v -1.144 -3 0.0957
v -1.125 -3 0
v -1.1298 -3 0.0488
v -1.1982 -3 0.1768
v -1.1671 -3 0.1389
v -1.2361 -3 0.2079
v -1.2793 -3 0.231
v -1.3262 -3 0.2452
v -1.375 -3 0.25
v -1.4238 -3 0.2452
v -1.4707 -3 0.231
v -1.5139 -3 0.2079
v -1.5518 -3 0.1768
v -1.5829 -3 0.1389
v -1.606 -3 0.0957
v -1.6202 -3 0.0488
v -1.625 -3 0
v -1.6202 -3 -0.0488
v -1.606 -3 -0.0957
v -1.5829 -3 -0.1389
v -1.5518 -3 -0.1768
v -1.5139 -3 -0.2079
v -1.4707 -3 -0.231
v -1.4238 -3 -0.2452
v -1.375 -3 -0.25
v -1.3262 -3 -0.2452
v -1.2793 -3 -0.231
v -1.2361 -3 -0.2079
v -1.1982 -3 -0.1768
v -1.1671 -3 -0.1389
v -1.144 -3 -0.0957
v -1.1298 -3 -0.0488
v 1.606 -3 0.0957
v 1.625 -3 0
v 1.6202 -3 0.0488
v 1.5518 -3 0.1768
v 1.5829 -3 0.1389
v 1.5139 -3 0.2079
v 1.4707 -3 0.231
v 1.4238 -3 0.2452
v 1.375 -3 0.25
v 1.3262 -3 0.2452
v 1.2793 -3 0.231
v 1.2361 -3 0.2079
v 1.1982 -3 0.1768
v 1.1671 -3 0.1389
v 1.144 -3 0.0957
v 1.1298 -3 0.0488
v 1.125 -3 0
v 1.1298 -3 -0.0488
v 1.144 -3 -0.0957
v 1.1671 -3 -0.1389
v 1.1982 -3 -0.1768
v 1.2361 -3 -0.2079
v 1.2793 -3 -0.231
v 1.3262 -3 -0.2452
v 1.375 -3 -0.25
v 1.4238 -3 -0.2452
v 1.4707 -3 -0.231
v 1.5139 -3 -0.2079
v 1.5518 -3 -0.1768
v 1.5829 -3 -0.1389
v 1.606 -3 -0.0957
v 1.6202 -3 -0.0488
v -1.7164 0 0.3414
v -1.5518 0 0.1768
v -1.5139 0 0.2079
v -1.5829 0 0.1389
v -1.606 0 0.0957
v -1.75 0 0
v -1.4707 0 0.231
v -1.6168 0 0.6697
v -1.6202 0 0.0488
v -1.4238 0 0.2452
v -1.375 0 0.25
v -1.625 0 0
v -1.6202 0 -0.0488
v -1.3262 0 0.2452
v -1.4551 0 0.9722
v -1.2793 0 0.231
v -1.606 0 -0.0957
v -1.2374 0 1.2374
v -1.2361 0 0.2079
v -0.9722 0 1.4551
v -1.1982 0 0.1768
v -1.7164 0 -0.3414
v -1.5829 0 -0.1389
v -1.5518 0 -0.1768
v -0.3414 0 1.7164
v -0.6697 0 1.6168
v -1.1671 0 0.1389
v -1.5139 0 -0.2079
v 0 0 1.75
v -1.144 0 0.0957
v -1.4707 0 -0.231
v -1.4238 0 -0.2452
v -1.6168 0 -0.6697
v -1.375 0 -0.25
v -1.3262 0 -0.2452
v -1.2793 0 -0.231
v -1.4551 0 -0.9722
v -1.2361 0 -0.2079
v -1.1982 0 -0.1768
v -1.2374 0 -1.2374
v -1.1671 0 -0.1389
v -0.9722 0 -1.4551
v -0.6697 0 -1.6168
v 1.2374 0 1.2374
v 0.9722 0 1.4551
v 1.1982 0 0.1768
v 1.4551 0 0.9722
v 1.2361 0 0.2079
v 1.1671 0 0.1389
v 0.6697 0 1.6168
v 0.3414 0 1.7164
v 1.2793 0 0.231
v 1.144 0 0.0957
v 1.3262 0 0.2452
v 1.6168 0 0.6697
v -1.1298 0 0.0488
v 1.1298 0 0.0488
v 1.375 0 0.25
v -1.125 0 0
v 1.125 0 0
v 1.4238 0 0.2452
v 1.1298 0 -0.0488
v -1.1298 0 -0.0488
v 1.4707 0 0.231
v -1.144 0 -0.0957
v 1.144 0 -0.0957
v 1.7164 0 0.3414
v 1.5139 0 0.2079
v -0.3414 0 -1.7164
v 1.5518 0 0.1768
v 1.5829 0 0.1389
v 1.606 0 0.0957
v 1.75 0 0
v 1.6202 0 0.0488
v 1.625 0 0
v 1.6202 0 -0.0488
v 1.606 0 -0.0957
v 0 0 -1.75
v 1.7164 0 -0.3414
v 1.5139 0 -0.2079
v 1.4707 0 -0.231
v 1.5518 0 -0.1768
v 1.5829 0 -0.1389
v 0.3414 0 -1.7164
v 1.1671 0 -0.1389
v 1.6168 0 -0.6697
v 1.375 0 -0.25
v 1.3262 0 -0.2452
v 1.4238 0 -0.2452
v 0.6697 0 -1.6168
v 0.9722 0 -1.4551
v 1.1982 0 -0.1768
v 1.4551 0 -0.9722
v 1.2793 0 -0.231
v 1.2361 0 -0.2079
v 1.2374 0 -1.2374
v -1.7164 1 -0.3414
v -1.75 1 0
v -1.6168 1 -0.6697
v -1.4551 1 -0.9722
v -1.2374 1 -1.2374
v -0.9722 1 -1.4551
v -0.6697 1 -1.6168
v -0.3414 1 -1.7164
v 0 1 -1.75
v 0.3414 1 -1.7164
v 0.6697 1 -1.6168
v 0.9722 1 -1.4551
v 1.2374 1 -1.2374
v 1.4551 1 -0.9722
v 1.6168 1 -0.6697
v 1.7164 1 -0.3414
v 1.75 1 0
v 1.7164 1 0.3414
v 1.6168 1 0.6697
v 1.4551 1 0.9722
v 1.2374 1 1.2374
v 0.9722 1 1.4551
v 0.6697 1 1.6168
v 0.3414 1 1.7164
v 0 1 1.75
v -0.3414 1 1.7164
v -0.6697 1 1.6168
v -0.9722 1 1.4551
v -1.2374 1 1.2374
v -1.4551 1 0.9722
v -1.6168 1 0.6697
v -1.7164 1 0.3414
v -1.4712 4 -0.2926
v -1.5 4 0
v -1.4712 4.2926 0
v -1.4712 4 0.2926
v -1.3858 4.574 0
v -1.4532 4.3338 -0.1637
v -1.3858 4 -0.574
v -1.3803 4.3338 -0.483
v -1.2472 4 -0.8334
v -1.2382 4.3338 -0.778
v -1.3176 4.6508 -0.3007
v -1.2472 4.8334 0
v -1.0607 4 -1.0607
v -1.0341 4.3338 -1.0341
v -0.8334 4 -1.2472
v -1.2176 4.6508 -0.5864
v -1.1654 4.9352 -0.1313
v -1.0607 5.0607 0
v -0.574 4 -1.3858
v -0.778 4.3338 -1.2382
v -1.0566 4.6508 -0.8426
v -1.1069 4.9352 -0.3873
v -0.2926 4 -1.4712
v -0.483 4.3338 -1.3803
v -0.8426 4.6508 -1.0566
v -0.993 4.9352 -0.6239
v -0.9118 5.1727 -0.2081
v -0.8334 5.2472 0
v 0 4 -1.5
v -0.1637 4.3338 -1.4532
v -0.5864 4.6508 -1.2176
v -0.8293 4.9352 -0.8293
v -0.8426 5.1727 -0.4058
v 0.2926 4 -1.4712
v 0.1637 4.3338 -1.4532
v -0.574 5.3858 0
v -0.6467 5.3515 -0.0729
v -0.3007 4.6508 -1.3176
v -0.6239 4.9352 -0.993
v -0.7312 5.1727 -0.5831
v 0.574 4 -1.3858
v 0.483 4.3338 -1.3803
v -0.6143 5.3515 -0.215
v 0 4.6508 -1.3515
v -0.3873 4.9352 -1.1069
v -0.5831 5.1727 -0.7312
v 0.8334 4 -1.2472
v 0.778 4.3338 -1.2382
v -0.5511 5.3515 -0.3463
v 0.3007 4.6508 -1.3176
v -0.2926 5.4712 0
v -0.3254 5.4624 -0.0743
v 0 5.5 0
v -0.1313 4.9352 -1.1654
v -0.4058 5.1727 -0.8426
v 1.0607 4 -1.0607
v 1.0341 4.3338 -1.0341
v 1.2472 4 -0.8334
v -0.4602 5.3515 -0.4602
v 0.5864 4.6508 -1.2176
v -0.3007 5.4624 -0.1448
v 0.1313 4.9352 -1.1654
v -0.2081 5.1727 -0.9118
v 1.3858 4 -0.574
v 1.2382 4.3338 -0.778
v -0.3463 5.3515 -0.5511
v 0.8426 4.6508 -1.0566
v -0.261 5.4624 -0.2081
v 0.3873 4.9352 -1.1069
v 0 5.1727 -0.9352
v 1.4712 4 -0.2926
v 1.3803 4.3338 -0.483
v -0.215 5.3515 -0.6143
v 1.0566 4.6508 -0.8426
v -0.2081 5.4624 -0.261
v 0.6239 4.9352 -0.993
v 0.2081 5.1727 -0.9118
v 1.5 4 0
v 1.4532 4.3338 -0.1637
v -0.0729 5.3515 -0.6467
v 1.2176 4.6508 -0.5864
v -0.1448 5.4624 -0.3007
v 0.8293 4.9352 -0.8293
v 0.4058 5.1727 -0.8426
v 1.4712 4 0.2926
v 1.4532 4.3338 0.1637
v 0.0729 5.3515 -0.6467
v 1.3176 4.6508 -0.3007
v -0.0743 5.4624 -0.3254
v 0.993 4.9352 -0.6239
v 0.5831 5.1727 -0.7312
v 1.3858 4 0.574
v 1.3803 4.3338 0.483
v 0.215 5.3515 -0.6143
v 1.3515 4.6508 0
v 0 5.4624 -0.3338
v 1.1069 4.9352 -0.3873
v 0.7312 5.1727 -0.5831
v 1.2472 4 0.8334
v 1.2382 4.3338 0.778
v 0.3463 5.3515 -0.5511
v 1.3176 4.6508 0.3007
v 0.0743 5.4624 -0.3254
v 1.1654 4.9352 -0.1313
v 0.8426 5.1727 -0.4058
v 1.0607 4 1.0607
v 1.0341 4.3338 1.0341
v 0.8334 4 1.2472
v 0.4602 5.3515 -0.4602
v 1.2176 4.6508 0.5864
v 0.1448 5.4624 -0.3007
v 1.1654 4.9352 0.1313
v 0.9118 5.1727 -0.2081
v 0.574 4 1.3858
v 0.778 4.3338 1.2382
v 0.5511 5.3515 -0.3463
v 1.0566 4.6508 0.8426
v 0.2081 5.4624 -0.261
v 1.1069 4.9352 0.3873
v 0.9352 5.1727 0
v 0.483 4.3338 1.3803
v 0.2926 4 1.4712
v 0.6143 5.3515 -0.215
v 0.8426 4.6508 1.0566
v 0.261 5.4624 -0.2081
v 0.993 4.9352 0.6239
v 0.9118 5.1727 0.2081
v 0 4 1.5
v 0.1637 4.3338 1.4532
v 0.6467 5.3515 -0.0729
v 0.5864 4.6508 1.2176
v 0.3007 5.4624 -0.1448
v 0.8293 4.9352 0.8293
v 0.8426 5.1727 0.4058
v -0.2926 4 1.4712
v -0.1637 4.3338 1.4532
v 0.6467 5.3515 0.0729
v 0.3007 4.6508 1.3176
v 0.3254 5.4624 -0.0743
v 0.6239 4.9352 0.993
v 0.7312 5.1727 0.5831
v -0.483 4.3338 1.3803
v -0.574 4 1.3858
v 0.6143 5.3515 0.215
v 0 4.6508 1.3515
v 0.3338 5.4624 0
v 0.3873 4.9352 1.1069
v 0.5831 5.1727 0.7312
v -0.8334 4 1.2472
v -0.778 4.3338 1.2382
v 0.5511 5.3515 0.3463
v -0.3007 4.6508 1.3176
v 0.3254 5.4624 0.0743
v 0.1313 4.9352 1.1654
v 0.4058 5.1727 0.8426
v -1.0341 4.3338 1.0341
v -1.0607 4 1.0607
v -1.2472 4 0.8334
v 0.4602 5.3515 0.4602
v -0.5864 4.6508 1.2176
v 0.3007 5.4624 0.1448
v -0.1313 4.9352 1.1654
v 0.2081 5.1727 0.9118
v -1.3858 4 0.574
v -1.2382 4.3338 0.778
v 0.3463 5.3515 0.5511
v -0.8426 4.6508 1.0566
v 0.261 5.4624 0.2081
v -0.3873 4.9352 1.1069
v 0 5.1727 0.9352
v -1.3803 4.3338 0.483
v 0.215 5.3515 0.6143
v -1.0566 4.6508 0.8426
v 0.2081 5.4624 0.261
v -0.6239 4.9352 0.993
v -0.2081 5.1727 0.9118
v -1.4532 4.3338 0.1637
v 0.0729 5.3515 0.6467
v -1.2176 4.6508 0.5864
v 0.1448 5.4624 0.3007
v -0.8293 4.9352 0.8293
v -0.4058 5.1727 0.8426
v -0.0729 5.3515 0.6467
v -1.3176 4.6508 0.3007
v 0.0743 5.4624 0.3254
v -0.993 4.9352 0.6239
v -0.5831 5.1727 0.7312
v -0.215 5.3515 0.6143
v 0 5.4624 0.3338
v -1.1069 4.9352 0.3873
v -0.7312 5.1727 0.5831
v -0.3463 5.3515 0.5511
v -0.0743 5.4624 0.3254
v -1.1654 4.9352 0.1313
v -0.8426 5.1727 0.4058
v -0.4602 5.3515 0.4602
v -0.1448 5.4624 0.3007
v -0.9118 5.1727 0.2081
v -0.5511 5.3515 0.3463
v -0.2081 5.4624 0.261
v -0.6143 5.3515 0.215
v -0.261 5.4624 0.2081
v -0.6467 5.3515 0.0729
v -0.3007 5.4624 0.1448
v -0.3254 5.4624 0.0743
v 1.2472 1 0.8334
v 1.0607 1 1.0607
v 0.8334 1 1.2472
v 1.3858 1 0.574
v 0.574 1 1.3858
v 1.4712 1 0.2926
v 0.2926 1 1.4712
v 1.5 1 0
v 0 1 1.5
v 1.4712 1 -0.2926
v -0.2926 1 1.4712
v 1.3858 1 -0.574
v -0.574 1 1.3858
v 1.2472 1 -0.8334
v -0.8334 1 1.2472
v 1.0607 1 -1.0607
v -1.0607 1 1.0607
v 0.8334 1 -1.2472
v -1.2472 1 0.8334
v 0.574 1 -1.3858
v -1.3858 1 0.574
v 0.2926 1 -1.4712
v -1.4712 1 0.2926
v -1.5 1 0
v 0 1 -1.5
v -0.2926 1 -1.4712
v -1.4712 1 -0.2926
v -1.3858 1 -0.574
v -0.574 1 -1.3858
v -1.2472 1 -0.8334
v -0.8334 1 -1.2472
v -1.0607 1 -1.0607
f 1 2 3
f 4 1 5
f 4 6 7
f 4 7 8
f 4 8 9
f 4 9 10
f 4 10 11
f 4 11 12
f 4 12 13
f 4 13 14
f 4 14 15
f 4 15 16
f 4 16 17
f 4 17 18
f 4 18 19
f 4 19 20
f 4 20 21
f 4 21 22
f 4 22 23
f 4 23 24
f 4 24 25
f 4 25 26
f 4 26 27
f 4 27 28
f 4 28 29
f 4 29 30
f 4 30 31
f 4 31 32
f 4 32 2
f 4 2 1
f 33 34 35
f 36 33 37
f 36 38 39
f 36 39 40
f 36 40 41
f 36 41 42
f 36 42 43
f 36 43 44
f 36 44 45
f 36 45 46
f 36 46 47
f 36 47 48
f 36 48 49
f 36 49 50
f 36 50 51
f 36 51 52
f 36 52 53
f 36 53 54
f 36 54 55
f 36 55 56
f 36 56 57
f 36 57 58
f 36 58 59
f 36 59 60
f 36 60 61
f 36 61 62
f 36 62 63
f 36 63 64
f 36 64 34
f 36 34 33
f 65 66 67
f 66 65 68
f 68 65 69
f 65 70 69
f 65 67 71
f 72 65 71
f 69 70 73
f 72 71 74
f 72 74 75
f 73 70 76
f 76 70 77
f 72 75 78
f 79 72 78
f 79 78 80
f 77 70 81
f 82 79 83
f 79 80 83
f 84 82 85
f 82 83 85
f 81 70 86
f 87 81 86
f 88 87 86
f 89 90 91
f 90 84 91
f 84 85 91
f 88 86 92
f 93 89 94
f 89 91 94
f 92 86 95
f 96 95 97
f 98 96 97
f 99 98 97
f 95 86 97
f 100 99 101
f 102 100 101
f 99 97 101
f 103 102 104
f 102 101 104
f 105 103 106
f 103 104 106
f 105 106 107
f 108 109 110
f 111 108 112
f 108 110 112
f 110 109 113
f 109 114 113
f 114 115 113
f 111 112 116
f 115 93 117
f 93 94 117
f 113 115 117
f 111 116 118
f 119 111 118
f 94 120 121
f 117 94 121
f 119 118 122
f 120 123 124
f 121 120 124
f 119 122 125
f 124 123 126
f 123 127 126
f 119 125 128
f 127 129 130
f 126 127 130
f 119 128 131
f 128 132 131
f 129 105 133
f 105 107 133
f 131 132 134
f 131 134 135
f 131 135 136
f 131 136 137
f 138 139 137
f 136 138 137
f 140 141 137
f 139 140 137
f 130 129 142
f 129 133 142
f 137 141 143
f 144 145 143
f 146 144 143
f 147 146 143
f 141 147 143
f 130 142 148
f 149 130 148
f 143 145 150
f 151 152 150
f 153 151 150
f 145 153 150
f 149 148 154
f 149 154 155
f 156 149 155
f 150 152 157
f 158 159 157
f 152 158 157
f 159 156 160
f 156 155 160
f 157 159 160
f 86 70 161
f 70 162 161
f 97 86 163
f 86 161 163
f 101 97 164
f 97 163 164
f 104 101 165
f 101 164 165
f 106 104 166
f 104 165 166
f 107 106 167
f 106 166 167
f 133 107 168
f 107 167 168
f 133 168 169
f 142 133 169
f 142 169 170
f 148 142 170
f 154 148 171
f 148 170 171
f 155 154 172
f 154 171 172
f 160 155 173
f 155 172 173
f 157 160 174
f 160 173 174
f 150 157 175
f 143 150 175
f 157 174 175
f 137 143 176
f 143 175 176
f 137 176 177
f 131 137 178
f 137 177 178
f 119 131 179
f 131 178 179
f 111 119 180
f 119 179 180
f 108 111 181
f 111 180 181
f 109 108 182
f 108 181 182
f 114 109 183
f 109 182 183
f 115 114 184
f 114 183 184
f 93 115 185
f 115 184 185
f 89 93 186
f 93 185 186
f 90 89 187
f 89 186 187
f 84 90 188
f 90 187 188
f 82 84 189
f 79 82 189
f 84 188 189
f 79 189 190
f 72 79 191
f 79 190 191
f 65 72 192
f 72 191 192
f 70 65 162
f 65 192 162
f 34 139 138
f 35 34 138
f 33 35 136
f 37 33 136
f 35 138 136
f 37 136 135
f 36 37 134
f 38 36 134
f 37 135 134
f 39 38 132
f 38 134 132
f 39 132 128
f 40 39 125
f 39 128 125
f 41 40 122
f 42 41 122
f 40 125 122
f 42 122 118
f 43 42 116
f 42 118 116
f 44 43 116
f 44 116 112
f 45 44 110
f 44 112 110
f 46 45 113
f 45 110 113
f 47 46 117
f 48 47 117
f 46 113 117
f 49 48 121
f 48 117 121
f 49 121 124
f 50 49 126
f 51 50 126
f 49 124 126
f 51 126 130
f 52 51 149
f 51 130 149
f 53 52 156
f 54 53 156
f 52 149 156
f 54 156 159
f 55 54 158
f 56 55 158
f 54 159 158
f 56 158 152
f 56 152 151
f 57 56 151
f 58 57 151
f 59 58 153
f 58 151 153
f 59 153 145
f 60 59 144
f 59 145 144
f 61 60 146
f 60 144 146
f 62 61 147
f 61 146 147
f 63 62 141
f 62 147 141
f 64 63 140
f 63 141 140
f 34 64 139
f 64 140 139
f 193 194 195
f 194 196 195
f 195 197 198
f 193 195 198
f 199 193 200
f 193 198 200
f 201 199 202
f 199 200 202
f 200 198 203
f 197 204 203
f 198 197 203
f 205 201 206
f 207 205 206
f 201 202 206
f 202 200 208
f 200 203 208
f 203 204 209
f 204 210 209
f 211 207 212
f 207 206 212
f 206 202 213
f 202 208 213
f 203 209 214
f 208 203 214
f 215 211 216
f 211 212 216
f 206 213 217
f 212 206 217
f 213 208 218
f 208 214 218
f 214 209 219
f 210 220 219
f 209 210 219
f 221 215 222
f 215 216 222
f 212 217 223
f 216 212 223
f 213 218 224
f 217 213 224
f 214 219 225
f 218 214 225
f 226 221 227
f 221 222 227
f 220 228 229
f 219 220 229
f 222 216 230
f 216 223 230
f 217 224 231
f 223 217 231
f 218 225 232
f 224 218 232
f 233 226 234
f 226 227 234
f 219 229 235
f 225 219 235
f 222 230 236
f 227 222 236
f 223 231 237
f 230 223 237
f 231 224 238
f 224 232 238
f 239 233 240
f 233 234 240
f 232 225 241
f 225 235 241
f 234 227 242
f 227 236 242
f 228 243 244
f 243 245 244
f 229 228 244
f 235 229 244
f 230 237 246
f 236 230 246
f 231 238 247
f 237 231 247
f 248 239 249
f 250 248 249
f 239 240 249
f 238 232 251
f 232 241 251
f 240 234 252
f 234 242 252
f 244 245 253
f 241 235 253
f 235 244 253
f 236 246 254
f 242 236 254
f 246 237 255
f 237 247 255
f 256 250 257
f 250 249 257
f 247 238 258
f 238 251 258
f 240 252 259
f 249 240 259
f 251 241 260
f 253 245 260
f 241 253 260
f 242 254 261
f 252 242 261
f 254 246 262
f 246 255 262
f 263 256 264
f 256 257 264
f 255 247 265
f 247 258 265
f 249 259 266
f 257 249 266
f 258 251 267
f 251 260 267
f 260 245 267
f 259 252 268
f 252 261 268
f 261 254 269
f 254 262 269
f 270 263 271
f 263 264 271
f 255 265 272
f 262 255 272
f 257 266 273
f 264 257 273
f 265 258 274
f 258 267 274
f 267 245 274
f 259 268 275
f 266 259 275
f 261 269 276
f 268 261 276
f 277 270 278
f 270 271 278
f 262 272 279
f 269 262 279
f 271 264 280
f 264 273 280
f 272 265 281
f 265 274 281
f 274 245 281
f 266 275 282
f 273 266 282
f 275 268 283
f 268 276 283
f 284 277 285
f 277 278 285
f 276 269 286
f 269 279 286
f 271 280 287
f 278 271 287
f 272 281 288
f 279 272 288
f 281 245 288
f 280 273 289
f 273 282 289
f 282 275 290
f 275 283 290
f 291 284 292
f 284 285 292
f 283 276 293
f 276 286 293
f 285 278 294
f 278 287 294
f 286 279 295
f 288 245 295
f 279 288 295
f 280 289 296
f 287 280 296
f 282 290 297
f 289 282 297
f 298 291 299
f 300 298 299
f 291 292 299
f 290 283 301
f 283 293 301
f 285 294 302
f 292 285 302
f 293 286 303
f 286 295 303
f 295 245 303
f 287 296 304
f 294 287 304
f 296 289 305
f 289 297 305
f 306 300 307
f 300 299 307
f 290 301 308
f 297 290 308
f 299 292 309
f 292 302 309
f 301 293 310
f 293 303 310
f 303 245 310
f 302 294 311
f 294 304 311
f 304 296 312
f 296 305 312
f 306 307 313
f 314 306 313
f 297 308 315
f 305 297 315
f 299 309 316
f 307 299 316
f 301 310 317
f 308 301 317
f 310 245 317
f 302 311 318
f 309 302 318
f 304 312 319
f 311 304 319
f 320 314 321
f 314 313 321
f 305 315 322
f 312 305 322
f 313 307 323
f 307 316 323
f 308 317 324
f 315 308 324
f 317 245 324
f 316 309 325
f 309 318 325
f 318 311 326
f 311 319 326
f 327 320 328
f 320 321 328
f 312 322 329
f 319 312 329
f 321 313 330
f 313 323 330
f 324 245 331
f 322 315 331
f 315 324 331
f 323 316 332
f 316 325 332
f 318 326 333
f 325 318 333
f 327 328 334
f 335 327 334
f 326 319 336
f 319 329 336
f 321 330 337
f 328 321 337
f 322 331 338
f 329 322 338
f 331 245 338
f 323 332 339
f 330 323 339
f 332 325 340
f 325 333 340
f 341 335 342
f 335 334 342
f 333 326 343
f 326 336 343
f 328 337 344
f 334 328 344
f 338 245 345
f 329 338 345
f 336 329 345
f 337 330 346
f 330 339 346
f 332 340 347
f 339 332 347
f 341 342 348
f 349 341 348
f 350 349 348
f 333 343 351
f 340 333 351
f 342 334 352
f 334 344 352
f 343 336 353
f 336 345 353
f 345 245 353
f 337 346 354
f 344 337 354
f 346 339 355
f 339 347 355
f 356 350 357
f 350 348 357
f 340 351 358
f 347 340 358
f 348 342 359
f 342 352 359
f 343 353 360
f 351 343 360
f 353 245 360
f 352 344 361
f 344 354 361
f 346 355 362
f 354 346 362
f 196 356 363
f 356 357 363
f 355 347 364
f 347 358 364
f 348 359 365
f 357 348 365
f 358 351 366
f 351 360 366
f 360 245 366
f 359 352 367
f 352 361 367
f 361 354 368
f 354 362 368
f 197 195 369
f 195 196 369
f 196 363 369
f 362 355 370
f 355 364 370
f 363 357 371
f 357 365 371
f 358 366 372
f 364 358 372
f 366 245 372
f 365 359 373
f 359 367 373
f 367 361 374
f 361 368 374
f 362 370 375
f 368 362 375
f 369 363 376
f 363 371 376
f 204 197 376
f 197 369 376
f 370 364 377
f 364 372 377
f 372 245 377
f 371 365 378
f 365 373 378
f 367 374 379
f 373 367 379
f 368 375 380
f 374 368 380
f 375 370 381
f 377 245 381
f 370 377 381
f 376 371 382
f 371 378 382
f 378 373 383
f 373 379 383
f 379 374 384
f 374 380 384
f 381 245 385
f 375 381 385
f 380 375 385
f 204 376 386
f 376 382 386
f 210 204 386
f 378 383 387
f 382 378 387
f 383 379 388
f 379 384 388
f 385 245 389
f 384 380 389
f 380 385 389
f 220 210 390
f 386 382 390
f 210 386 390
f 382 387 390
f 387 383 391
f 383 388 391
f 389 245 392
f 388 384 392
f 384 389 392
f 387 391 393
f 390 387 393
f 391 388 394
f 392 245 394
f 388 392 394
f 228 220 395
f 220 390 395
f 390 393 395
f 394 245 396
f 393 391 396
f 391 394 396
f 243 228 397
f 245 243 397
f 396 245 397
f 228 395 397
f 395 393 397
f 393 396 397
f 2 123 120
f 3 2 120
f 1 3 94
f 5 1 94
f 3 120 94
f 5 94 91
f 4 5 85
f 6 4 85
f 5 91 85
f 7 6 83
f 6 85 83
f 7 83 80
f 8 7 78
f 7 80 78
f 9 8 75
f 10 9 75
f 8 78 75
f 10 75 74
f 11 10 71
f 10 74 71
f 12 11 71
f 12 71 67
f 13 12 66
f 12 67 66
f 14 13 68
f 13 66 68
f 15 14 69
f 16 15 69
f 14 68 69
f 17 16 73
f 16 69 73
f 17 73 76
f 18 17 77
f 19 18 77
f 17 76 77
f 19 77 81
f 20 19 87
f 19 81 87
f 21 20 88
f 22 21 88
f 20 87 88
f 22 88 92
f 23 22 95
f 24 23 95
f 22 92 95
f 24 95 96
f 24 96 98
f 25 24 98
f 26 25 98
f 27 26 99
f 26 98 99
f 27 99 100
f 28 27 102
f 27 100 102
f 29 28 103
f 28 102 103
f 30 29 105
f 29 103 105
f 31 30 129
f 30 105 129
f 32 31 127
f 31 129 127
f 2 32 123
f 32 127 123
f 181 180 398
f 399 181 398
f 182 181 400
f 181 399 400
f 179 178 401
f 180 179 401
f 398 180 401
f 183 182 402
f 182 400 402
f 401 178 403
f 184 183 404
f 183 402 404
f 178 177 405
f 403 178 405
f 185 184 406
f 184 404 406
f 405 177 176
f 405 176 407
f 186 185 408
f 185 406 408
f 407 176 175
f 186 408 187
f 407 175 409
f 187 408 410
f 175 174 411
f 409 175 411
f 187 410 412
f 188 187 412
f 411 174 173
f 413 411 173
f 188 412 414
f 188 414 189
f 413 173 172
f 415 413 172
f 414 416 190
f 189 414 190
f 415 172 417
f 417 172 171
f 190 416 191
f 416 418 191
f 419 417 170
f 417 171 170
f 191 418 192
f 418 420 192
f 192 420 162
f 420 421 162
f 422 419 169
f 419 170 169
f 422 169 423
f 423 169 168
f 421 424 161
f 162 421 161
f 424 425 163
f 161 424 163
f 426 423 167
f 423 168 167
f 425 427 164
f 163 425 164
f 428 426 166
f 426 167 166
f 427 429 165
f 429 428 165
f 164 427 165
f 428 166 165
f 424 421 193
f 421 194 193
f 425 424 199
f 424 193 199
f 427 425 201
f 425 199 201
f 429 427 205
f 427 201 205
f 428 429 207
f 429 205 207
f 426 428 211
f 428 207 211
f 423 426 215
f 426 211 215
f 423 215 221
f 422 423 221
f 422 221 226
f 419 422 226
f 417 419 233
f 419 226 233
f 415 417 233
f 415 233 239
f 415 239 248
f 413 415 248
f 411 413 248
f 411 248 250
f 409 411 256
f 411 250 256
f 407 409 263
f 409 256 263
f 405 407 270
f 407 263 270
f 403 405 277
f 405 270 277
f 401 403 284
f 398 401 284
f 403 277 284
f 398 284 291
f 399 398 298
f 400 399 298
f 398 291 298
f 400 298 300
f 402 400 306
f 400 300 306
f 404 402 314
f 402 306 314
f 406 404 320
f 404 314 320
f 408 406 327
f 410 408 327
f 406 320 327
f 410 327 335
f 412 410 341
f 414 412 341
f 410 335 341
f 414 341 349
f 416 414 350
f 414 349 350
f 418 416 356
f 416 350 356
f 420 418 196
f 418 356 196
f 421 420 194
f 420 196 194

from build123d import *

# Parameters (mm, degrees)
SKETCH2_R           = 0.25
BOSS_EXTRUDE1_DEPTH = 3


with BuildPart() as part:
    # Sketch1 → Revolve1 (revolve)
    with BuildSketch(Plane.XY):
        with BuildLine():
            Line((0, 0), (-1.75, 0))
            Line((-1.75, 0), (-1.75, 1))
            Line((-1.75, 1), (-1.5, 1))
            Line((-1.5, 1), (-1.5, 4))
            ThreePointArc((-1.5, 4), (-1.060660172, 5.060660172), (0, 5.5))
            Line((0, 5.5), (0, 0))
        make_face()
    revolve(axis=Axis((0, 5.5, 0), (0, -1, 0)))

    # Sketch2 → Boss-Extrude1 (add)
    with BuildSketch(Plane.XZ):
        with Locations((-1.375, 0)):
            Circle(SKETCH2_R)
        with Locations((1.375, 0)):
            Circle(SKETCH2_R)
    extrude(amount=BOSS_EXTRUDE1_DEPTH)


solid = part.part
